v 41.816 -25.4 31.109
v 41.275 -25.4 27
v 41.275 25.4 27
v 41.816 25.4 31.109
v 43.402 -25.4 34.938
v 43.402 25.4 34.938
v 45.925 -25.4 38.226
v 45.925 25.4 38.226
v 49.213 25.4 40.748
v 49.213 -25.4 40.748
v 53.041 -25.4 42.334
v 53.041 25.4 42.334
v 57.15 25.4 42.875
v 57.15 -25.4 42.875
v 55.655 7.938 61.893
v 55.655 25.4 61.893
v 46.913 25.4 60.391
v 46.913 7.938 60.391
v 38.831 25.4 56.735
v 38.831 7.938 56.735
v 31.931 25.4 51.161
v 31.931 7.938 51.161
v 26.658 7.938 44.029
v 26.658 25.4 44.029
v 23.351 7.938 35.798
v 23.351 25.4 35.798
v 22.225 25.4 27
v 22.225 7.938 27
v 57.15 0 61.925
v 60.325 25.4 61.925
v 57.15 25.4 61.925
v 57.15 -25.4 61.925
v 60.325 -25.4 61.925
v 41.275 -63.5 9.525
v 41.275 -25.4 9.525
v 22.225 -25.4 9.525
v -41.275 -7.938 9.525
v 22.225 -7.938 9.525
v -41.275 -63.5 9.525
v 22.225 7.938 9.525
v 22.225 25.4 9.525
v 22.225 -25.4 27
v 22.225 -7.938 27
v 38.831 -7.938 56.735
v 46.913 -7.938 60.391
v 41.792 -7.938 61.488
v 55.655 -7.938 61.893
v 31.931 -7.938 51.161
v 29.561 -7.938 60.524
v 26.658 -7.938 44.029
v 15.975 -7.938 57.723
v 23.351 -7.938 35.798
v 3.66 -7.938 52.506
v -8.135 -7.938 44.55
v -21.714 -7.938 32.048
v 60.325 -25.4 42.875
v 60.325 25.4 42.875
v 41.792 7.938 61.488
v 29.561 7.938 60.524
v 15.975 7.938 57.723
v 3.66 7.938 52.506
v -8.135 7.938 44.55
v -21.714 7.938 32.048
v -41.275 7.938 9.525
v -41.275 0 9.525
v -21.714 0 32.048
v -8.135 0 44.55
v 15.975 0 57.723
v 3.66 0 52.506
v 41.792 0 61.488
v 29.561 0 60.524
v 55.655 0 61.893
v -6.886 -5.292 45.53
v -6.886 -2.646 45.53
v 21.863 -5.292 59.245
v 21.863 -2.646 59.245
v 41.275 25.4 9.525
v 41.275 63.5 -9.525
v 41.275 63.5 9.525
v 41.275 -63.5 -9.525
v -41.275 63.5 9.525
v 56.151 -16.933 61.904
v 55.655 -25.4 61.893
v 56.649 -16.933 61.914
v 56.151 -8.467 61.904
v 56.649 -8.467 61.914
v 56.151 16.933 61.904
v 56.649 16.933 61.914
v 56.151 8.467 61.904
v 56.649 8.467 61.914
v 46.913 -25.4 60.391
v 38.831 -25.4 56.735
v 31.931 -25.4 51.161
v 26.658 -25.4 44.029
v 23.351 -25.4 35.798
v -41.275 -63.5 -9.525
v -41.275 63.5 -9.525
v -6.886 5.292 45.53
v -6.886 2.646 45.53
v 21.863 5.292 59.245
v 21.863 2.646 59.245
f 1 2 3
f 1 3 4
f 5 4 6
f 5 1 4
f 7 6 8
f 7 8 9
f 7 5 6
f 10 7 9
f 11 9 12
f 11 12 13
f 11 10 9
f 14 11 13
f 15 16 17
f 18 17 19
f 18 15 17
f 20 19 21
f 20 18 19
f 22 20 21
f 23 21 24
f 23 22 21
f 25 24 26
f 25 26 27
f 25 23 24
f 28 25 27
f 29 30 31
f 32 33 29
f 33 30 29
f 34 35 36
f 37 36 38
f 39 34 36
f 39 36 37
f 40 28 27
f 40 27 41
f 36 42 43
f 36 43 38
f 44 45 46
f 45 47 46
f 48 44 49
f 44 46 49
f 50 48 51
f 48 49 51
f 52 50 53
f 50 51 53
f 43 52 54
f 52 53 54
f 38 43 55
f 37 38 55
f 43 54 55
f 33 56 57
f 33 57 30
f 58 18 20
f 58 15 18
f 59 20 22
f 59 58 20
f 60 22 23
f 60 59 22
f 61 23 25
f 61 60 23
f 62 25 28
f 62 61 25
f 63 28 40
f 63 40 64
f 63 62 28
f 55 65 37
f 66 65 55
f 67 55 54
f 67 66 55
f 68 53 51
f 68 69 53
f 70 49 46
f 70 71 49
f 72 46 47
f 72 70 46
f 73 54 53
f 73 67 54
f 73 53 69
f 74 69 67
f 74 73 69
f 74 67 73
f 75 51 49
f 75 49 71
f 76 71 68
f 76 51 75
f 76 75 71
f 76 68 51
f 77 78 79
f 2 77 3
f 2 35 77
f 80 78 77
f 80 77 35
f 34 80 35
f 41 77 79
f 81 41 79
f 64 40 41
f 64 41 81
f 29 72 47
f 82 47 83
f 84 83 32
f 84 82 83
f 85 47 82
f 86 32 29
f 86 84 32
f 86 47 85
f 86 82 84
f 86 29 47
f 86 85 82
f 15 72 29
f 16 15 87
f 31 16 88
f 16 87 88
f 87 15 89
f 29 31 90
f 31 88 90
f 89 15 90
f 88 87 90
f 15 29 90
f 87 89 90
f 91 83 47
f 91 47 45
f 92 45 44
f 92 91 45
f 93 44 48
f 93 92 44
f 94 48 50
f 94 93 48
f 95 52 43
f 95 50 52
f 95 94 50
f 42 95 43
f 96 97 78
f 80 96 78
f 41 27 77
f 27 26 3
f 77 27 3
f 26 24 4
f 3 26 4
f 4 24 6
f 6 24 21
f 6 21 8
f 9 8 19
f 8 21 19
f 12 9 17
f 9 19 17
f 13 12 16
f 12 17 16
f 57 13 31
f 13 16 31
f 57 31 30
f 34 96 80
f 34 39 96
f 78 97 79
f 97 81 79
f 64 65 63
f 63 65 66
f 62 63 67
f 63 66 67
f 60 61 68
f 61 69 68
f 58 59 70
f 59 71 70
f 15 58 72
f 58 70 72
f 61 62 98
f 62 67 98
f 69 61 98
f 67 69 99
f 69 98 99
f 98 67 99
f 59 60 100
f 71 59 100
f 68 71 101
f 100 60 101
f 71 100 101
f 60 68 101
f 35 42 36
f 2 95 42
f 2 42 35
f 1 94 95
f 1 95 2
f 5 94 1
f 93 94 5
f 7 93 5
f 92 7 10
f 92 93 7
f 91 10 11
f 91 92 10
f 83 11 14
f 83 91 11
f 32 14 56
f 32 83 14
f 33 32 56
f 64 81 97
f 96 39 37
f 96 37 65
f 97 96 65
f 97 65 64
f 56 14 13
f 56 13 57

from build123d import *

# Parameters (mm, degrees)
F1_DEPTH = 63.5
F2_DEPTH = 25.4
F3_DEPTH = 7.9375


with BuildPart() as f1:
    # F0 (on Front) → F1 (new body, symmetric)
    with BuildSketch(Plane.XZ):
        Polygon((-41.275, -9.525), (41.275, -9.525), (41.275, 9.525), (22.225, 9.525), (-41.275, 9.525), align=None)
    extrude(amount=F1_DEPTH, both=True)

    # F0 (on Front) → F2 (join, symmetric)
    with BuildSketch(Plane.XZ):
        with BuildLine():
            Line((22.225, 9.525), (41.275, 9.525))
            Line((41.275, 9.525), (41.275, 27.0002))
            ThreePointArc((41.275, 27.0002), (45.9246798487, 38.2255201513), (57.15, 42.8752))
            Line((57.15, 42.8752), (60.325, 42.8752))
            Line((60.325, 42.8752), (60.325, 61.9252))
            Line((60.325, 61.9252), (57.15, 61.9252))
            add(Edge.make_bspline(
                [(55.6546739899, 61.8931738647), (56.1494536046, 61.9037814957), (56.6478649939, 61.9144247136), (57.15, 61.9252)],
                knots=[110.1378686708, 110.1378686708, 110.1378686708, 110.1378686708, 111.5045361635, 111.5045361635, 111.5045361635, 111.5045361635], degree=3))
            ThreePointArc((55.6546739899, 61.8931738647), (31.9311589689, 51.1614433879), (22.225, 27.0002))
            Line((22.225, 27.0002), (22.225, 9.525))
        make_face()
    extrude(amount=F2_DEPTH, both=True)

    # F0 (on Front) → F3 (join, symmetric)
    with BuildSketch(Plane.XZ):
        with BuildLine():
            add(Edge.make_bspline(
                [(-41.275, 9.525), (-0.5058915332, 60.4145856104), (15.7810598781, 61.0383193594), (55.6546739899, 61.8931738647)],
                knots=[0, 0, 0, 0, 110.1378686708, 110.1378686708, 110.1378686708, 110.1378686708], degree=3))
            Line((-41.275, 9.525), (22.225, 9.525))
            Line((22.225, 9.525), (22.225, 27.0002))
            ThreePointArc((22.225, 27.0002), (31.9311589689, 51.1614433879), (55.6546739899, 61.8931738647))
        make_face()
    extrude(amount=F3_DEPTH, both=True)


solid = f1.part
